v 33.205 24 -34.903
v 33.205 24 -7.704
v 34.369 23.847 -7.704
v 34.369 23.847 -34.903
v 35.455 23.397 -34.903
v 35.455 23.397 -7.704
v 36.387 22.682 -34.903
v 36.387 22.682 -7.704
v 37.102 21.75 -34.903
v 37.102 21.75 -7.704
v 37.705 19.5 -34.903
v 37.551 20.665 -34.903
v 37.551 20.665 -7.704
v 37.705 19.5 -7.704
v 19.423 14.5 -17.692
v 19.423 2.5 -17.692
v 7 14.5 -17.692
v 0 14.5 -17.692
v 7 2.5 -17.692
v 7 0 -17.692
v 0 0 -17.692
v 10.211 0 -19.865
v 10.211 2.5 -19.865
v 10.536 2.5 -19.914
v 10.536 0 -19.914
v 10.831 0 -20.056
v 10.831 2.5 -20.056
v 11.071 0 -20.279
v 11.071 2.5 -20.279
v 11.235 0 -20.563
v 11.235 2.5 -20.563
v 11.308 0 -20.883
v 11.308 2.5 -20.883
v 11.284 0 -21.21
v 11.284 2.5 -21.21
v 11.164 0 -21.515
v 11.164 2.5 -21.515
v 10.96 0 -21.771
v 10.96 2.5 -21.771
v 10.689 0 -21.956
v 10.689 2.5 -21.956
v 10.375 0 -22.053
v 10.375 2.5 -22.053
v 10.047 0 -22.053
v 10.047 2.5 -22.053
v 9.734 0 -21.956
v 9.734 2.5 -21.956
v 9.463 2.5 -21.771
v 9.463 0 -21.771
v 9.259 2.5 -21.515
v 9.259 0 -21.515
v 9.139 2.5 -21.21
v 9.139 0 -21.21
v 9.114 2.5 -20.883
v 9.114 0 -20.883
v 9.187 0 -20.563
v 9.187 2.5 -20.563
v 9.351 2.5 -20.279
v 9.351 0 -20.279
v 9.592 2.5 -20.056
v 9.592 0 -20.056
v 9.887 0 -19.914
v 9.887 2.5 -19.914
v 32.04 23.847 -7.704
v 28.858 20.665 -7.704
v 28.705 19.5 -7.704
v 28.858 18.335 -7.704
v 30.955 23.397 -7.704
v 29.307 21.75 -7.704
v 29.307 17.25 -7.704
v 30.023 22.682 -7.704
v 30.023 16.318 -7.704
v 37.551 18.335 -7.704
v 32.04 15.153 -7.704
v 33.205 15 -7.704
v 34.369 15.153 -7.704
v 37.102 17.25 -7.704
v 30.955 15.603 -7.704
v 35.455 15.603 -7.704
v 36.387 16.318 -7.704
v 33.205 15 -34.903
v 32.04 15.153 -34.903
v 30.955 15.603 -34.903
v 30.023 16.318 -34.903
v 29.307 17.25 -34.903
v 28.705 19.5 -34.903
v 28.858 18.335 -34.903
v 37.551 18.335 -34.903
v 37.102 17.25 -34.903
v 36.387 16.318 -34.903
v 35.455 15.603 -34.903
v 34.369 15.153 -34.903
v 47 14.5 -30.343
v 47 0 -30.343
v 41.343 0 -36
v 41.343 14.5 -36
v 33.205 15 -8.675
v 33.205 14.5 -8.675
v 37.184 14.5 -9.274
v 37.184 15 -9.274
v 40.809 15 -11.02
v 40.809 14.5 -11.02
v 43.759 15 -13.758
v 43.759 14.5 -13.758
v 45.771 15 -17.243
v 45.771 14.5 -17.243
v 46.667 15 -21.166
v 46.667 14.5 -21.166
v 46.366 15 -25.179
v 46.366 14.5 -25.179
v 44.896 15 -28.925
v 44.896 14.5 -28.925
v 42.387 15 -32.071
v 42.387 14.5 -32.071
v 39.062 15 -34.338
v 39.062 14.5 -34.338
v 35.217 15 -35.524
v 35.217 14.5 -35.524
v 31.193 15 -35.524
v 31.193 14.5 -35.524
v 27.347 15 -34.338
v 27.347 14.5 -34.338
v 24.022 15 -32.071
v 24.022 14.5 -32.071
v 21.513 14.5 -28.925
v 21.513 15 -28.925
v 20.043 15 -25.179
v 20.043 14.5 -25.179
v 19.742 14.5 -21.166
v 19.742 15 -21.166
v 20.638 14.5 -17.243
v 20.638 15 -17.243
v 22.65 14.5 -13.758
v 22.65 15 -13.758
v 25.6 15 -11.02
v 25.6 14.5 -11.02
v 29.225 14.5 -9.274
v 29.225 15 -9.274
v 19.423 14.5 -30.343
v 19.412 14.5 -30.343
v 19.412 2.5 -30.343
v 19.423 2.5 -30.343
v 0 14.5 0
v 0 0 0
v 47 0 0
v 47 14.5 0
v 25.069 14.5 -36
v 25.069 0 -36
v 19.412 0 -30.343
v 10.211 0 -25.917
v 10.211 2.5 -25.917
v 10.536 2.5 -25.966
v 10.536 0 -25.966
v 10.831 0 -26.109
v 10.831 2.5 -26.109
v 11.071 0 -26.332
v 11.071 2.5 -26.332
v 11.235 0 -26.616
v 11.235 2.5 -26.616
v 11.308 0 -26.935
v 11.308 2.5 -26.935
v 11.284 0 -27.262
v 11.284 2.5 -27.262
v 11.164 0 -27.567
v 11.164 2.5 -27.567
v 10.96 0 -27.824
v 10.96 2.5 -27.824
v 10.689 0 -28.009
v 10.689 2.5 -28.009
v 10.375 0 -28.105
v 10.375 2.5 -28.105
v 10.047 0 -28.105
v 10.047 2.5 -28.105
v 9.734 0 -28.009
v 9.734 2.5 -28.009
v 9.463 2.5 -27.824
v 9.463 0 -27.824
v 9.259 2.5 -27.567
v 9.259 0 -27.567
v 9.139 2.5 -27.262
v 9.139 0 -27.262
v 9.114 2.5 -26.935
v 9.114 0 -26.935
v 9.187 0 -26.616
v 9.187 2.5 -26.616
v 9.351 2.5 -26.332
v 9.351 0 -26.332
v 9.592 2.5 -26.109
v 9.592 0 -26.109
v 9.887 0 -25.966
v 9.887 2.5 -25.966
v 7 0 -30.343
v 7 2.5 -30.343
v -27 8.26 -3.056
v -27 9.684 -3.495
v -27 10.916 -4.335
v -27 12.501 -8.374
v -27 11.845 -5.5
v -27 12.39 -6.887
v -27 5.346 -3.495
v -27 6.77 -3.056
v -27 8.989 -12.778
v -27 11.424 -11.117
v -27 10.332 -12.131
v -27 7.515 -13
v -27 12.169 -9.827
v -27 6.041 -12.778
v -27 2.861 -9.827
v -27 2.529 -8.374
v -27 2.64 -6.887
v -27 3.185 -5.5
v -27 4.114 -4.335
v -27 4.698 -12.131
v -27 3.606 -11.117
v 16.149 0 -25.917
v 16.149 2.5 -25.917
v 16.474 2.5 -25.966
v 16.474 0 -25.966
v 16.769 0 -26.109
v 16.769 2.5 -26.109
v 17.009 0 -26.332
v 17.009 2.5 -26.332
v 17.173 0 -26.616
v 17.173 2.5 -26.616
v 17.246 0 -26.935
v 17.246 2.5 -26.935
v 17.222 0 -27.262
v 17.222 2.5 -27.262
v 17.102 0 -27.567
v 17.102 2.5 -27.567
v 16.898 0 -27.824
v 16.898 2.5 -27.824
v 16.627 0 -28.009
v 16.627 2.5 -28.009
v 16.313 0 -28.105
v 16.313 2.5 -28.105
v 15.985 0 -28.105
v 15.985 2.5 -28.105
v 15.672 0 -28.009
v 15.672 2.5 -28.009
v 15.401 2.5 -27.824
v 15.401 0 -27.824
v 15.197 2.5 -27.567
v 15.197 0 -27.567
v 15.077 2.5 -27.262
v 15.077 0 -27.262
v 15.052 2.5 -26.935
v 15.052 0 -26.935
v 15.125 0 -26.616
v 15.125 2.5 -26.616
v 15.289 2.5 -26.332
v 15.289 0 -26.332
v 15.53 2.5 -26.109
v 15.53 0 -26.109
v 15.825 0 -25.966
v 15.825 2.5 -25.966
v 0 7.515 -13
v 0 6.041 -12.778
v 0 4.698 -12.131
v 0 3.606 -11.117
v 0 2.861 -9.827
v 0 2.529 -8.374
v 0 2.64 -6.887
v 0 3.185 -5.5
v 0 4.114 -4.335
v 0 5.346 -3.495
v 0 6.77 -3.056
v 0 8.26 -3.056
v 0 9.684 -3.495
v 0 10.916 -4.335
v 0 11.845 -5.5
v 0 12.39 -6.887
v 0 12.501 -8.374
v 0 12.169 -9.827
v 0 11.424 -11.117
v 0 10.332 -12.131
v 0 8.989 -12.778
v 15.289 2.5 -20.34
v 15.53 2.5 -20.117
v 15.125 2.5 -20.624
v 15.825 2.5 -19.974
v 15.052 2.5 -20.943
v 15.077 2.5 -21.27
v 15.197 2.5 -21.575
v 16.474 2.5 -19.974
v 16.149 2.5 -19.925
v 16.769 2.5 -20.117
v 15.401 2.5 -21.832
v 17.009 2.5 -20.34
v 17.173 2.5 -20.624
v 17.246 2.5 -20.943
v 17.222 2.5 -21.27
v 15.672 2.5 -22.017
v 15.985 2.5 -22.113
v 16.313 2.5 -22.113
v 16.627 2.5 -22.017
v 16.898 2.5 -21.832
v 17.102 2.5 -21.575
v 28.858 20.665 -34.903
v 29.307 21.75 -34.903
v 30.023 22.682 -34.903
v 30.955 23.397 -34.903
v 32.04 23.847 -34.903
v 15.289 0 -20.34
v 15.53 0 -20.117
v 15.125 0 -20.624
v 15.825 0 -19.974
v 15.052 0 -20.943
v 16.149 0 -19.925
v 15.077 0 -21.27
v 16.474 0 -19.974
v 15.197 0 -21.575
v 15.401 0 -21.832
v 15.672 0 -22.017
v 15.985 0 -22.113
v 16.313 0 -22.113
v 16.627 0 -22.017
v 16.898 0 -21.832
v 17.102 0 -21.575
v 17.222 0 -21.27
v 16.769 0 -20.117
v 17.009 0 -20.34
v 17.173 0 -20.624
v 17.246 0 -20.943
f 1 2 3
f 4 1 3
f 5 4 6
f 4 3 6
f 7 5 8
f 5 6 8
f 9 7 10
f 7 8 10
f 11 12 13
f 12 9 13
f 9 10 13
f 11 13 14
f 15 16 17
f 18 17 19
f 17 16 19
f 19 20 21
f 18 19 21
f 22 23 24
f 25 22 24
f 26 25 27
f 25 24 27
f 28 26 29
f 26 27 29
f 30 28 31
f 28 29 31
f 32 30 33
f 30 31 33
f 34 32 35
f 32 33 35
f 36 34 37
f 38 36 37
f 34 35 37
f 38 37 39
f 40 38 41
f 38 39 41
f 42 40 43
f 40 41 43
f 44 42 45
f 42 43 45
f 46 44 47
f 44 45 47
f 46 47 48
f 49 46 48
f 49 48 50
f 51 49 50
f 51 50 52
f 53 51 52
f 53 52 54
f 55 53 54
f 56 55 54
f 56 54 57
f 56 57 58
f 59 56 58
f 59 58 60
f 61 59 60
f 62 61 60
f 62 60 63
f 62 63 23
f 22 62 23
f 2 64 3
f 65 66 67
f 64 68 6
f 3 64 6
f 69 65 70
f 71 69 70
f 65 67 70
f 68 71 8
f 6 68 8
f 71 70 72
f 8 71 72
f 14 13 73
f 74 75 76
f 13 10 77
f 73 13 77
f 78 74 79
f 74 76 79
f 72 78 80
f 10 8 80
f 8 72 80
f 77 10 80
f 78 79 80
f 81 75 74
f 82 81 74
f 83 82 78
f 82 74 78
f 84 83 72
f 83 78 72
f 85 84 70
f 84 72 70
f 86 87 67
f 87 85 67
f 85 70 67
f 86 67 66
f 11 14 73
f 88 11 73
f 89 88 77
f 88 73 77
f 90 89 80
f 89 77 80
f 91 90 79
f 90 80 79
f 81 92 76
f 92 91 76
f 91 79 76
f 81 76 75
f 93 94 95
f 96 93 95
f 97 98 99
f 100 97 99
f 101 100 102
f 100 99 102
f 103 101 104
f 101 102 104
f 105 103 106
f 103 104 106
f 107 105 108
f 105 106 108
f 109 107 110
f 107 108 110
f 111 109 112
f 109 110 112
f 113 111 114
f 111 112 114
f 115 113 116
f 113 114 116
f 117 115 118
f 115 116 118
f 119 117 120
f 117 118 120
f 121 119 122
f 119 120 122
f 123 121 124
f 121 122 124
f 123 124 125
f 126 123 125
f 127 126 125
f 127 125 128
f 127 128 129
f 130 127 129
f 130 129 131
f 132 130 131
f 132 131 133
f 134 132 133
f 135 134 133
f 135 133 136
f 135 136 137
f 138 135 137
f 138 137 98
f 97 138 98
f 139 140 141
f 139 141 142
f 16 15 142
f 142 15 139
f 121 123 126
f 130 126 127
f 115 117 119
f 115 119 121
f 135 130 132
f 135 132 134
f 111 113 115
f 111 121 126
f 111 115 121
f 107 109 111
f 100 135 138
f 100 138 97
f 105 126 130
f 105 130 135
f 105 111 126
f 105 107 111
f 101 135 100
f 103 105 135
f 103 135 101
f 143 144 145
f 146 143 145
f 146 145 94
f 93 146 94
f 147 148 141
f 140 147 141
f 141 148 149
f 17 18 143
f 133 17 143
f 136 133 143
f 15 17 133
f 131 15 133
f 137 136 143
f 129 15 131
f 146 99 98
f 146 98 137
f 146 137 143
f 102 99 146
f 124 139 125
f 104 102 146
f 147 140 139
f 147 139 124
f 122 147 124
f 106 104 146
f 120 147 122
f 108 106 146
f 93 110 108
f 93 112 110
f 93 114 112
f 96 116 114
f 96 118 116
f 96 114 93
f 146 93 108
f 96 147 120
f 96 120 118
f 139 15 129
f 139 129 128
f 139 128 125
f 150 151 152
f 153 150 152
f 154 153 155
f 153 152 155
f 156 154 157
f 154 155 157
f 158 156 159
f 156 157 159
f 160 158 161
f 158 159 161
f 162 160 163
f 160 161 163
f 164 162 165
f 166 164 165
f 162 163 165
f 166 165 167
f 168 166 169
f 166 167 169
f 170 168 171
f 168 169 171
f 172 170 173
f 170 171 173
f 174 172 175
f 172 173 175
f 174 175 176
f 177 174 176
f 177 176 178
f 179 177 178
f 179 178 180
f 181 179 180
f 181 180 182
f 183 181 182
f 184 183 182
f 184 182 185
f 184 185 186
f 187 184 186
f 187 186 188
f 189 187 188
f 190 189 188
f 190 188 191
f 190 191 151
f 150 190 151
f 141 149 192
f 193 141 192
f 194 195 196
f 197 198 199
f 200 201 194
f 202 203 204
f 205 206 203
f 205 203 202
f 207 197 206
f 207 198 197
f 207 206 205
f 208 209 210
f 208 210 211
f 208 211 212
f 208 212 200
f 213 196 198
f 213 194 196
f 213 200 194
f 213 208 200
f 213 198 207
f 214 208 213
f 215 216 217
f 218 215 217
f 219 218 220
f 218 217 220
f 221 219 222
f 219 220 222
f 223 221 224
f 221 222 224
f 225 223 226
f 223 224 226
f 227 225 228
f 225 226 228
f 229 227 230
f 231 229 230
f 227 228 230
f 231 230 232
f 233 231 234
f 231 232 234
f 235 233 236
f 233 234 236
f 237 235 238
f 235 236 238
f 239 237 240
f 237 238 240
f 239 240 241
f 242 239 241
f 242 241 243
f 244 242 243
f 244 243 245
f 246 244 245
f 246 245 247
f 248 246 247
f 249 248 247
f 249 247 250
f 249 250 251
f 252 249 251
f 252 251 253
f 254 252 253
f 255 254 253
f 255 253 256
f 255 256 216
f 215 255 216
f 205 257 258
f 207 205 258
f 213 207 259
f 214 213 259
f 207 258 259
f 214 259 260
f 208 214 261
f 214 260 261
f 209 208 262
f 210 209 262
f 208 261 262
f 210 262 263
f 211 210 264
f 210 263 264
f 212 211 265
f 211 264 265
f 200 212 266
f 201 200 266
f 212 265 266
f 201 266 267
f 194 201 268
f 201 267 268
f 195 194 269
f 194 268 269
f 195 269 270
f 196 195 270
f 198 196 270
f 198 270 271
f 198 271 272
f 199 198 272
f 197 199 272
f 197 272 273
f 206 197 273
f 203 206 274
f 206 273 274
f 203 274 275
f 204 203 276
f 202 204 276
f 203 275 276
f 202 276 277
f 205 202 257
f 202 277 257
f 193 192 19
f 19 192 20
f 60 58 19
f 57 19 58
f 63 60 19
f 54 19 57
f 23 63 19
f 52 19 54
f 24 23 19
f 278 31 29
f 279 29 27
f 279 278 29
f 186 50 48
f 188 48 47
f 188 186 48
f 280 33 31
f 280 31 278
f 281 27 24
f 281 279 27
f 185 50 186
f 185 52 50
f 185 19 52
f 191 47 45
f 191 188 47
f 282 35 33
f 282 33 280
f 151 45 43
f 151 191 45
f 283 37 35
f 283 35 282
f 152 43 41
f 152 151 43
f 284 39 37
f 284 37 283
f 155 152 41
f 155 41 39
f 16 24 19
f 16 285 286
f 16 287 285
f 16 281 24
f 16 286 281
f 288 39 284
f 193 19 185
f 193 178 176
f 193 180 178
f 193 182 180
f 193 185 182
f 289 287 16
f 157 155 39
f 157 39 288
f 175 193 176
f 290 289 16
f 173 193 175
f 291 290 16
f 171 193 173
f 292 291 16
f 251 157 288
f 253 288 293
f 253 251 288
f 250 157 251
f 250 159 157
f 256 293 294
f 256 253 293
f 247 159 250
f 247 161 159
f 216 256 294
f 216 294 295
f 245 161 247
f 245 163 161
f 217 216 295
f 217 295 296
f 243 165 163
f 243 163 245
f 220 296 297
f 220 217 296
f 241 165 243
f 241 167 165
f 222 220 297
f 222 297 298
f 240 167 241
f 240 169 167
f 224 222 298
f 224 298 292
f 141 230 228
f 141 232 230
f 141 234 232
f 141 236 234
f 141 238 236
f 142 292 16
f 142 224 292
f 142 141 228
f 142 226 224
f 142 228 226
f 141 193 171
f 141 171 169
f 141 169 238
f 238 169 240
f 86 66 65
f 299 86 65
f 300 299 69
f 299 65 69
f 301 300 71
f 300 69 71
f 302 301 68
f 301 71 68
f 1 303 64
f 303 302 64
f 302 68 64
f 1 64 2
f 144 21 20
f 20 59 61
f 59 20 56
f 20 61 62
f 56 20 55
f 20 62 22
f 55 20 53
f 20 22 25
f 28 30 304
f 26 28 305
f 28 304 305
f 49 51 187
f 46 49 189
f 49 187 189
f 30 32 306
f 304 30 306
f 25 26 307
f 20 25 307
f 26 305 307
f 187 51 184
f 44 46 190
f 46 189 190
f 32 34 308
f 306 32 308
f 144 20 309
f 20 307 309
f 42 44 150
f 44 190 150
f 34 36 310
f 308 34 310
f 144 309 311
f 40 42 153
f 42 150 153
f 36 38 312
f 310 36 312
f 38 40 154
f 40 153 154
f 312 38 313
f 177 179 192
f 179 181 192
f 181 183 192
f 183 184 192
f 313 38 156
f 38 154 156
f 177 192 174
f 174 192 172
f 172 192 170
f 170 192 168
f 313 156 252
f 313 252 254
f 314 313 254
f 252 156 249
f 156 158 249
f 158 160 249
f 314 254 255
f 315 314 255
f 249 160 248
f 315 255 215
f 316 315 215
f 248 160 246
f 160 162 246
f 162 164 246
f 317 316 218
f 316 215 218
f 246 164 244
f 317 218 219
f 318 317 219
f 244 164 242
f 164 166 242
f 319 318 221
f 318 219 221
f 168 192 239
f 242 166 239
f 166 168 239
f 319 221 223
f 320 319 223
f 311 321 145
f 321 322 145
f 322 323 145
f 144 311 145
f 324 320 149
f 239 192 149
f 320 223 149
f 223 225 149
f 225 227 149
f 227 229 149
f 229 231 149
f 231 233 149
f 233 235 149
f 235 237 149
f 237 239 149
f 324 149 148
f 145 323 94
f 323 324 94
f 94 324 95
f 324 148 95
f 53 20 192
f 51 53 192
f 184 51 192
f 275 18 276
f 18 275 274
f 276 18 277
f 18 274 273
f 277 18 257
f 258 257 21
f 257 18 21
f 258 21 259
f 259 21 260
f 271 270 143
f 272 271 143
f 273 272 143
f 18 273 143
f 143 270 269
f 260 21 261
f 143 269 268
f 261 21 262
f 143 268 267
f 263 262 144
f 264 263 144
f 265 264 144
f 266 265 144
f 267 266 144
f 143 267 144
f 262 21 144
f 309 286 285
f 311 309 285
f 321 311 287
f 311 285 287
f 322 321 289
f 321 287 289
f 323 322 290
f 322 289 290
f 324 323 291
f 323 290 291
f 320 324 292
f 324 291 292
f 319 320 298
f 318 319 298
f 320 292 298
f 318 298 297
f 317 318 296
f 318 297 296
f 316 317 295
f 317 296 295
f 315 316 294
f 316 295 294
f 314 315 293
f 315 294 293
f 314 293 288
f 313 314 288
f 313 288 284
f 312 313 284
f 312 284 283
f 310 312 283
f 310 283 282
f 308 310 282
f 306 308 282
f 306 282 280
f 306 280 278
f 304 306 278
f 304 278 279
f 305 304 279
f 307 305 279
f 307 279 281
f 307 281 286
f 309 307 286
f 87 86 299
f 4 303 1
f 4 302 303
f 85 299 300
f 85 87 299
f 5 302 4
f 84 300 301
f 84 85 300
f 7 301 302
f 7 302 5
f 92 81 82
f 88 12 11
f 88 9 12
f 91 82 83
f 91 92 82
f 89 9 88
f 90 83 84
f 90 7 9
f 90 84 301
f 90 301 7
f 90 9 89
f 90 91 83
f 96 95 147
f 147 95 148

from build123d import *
from build123d.topology import SkipClean

# Parameters (mm, degrees)
BOSS_EXTRUDE1_DEPTH = 14.5
SKETCH2_W           = 12.422845353
SKETCH2_H           = 12.651384387
CUT_EXTRUDE1_DEPTH  = 12
SKETCH3_R           = 1.1
CUT_EXTRUDE2_DEPTH  = 61.406953242
SKETCH4_R           = 5
BOSS_EXTRUDE2_DEPTH = 27
SKETCH5_R           = 13.5
BOSS_EXTRUDE3_DEPTH = 0.5
SKETCH6_W           = 9
SKETCH6_H           = 27.198164612
BOSS_EXTRUDE4_DEPTH = 9
CUT_EXTRUDE3_DEPTH  = 60.880218146


with BuildPart() as part:
    # Sketch1 → Boss-Extrude1 (new body)
    with BuildSketch(Plane(origin=(0, 0, 0), x_dir=(1, 0, 0), z_dir=(0, 1, 0))):
        Polygon((0, 0), (47, 0), (47, 30.343145751), (41.343145751, 36), (25.068998023, 36), (19.412143774, 30.343145751), (7, 30.343145751), (7, 17.691761364), (0, 17.691761364), align=None)
    extrude(amount=BOSS_EXTRUDE1_DEPTH)

    # Sketch2 → Cut-Extrude1 (cut)
    with BuildSketch(Plane(origin=(0, 14.5, 0), x_dir=(1, 0, 0), z_dir=(0, 1, 0))):
        with Locations((13.211422676, 24.017453558)):
            Rectangle(SKETCH2_W, SKETCH2_H)
    extrude(amount=-CUT_EXTRUDE1_DEPTH, mode=Mode.SUBTRACT)

    # Sketch3 → Cut-Extrude2 (cut, through all)
    with BuildSketch(Plane(origin=(0, 2.5, 0), x_dir=(1, 0, 0), z_dir=(0, 1, 0))):
        with Locations(Location((10.211422676, 27.017453557, 0), (0, 0, 270))):
            Circle(SKETCH3_R)
        with Locations(Location((16.149341191, 27.017453557, 0), (0, 0, 270))):
            Circle(SKETCH3_R)
        with Locations(Location((10.211422676, 20.965083317, 0), (0, 0, 270))):
            Circle(SKETCH3_R)
        with Locations(Location((16.149341191, 21.025487114, 0), (0, 0, 270))):
            Circle(SKETCH3_R)
    extrude(amount=-CUT_EXTRUDE2_DEPTH, mode=Mode.SUBTRACT)

    # Sketch4 → Boss-Extrude2 (add)
    with BuildSketch(Plane.ZY):
        with Locations(Location((-8, 7.514999755, 0), (0, 0, 180))):
            Circle(SKETCH4_R)
    extrude(amount=BOSS_EXTRUDE2_DEPTH)

    # Sketch5 → Boss-Extrude3 (add)
    with BuildSketch(Plane(origin=(0, 14.5, 0), x_dir=(1, 0, 0), z_dir=(0, 1, 0))):
        with Locations(Location((33.204612806, 22.174650575, 0), (0, 0, 270))):
            Circle(SKETCH5_R)
    extrude(amount=BOSS_EXTRUDE3_DEPTH)

    # Sketch6 → Boss-Extrude4 (add)
    with BuildSketch(Plane(origin=(0, 15, 0), x_dir=(1, 0, 0), z_dir=(0, 1, 0))):
        with Locations((33.204612806, 21.303490331)):
            Rectangle(SKETCH6_W, SKETCH6_H)
    extrude(amount=BOSS_EXTRUDE4_DEPTH)

    # Sketch7 → Cut-Extrude3 (cut, through all)
    with SkipClean():  # the faces are left unmerged after this step: merging them gives an invalid solid
        with BuildSketch(Plane.XY.offset(-7.704408025)):
            with BuildLine():
                Line((33.204612806, 24), (28.704612806, 24))
                Line((28.704612806, 24), (28.704612806, 19.5))
                ThreePointArc((28.704612806, 19.5), (30.022632291, 22.681980515), (33.204612806, 24))
            make_face()
            with BuildLine():
                Line((37.704612806, 24), (33.204612806, 24))
                ThreePointArc((33.204612806, 24), (36.386593321, 22.681980515), (37.704612806, 19.5))
                Line((37.704612806, 19.5), (37.704612806, 24))
            make_face()
            with BuildLine():
                Line((37.704612806, 15), (37.704612806, 19.5))
                ThreePointArc((37.704612806, 19.5), (36.386593321, 16.318019485), (33.204612806, 15))
                Line((33.204612806, 15), (37.704612806, 15))
            make_face()
            with BuildLine():
                ThreePointArc((33.204612806, 15), (30.022632291, 16.318019485), (28.704612806, 19.5))
                Line((28.704612806, 19.5), (28.704612806, 15))
                Line((28.704612806, 15), (33.204612806, 15))
            make_face()
        extrude(amount=-CUT_EXTRUDE3_DEPTH, mode=Mode.SUBTRACT)


with BuildPart() as cut_extrude3_piece_1:
    # of the separate pieces the step leaves, piece 1, a body of its own (cut_extrude3_pieces)
    add(part.part.solids().sort_by_distance((0, 0, 0))[0])


with BuildPart() as cut_extrude3_piece_2:
    # of the separate pieces the step leaves, piece 2, a body of its own (cut_extrude3_pieces)
    add(part.part.solids().sort_by_distance((37.704612806, 19.5, -7.704408025))[0])


solid = Compound([cut_extrude3_piece_1.part, cut_extrude3_piece_2.part])
